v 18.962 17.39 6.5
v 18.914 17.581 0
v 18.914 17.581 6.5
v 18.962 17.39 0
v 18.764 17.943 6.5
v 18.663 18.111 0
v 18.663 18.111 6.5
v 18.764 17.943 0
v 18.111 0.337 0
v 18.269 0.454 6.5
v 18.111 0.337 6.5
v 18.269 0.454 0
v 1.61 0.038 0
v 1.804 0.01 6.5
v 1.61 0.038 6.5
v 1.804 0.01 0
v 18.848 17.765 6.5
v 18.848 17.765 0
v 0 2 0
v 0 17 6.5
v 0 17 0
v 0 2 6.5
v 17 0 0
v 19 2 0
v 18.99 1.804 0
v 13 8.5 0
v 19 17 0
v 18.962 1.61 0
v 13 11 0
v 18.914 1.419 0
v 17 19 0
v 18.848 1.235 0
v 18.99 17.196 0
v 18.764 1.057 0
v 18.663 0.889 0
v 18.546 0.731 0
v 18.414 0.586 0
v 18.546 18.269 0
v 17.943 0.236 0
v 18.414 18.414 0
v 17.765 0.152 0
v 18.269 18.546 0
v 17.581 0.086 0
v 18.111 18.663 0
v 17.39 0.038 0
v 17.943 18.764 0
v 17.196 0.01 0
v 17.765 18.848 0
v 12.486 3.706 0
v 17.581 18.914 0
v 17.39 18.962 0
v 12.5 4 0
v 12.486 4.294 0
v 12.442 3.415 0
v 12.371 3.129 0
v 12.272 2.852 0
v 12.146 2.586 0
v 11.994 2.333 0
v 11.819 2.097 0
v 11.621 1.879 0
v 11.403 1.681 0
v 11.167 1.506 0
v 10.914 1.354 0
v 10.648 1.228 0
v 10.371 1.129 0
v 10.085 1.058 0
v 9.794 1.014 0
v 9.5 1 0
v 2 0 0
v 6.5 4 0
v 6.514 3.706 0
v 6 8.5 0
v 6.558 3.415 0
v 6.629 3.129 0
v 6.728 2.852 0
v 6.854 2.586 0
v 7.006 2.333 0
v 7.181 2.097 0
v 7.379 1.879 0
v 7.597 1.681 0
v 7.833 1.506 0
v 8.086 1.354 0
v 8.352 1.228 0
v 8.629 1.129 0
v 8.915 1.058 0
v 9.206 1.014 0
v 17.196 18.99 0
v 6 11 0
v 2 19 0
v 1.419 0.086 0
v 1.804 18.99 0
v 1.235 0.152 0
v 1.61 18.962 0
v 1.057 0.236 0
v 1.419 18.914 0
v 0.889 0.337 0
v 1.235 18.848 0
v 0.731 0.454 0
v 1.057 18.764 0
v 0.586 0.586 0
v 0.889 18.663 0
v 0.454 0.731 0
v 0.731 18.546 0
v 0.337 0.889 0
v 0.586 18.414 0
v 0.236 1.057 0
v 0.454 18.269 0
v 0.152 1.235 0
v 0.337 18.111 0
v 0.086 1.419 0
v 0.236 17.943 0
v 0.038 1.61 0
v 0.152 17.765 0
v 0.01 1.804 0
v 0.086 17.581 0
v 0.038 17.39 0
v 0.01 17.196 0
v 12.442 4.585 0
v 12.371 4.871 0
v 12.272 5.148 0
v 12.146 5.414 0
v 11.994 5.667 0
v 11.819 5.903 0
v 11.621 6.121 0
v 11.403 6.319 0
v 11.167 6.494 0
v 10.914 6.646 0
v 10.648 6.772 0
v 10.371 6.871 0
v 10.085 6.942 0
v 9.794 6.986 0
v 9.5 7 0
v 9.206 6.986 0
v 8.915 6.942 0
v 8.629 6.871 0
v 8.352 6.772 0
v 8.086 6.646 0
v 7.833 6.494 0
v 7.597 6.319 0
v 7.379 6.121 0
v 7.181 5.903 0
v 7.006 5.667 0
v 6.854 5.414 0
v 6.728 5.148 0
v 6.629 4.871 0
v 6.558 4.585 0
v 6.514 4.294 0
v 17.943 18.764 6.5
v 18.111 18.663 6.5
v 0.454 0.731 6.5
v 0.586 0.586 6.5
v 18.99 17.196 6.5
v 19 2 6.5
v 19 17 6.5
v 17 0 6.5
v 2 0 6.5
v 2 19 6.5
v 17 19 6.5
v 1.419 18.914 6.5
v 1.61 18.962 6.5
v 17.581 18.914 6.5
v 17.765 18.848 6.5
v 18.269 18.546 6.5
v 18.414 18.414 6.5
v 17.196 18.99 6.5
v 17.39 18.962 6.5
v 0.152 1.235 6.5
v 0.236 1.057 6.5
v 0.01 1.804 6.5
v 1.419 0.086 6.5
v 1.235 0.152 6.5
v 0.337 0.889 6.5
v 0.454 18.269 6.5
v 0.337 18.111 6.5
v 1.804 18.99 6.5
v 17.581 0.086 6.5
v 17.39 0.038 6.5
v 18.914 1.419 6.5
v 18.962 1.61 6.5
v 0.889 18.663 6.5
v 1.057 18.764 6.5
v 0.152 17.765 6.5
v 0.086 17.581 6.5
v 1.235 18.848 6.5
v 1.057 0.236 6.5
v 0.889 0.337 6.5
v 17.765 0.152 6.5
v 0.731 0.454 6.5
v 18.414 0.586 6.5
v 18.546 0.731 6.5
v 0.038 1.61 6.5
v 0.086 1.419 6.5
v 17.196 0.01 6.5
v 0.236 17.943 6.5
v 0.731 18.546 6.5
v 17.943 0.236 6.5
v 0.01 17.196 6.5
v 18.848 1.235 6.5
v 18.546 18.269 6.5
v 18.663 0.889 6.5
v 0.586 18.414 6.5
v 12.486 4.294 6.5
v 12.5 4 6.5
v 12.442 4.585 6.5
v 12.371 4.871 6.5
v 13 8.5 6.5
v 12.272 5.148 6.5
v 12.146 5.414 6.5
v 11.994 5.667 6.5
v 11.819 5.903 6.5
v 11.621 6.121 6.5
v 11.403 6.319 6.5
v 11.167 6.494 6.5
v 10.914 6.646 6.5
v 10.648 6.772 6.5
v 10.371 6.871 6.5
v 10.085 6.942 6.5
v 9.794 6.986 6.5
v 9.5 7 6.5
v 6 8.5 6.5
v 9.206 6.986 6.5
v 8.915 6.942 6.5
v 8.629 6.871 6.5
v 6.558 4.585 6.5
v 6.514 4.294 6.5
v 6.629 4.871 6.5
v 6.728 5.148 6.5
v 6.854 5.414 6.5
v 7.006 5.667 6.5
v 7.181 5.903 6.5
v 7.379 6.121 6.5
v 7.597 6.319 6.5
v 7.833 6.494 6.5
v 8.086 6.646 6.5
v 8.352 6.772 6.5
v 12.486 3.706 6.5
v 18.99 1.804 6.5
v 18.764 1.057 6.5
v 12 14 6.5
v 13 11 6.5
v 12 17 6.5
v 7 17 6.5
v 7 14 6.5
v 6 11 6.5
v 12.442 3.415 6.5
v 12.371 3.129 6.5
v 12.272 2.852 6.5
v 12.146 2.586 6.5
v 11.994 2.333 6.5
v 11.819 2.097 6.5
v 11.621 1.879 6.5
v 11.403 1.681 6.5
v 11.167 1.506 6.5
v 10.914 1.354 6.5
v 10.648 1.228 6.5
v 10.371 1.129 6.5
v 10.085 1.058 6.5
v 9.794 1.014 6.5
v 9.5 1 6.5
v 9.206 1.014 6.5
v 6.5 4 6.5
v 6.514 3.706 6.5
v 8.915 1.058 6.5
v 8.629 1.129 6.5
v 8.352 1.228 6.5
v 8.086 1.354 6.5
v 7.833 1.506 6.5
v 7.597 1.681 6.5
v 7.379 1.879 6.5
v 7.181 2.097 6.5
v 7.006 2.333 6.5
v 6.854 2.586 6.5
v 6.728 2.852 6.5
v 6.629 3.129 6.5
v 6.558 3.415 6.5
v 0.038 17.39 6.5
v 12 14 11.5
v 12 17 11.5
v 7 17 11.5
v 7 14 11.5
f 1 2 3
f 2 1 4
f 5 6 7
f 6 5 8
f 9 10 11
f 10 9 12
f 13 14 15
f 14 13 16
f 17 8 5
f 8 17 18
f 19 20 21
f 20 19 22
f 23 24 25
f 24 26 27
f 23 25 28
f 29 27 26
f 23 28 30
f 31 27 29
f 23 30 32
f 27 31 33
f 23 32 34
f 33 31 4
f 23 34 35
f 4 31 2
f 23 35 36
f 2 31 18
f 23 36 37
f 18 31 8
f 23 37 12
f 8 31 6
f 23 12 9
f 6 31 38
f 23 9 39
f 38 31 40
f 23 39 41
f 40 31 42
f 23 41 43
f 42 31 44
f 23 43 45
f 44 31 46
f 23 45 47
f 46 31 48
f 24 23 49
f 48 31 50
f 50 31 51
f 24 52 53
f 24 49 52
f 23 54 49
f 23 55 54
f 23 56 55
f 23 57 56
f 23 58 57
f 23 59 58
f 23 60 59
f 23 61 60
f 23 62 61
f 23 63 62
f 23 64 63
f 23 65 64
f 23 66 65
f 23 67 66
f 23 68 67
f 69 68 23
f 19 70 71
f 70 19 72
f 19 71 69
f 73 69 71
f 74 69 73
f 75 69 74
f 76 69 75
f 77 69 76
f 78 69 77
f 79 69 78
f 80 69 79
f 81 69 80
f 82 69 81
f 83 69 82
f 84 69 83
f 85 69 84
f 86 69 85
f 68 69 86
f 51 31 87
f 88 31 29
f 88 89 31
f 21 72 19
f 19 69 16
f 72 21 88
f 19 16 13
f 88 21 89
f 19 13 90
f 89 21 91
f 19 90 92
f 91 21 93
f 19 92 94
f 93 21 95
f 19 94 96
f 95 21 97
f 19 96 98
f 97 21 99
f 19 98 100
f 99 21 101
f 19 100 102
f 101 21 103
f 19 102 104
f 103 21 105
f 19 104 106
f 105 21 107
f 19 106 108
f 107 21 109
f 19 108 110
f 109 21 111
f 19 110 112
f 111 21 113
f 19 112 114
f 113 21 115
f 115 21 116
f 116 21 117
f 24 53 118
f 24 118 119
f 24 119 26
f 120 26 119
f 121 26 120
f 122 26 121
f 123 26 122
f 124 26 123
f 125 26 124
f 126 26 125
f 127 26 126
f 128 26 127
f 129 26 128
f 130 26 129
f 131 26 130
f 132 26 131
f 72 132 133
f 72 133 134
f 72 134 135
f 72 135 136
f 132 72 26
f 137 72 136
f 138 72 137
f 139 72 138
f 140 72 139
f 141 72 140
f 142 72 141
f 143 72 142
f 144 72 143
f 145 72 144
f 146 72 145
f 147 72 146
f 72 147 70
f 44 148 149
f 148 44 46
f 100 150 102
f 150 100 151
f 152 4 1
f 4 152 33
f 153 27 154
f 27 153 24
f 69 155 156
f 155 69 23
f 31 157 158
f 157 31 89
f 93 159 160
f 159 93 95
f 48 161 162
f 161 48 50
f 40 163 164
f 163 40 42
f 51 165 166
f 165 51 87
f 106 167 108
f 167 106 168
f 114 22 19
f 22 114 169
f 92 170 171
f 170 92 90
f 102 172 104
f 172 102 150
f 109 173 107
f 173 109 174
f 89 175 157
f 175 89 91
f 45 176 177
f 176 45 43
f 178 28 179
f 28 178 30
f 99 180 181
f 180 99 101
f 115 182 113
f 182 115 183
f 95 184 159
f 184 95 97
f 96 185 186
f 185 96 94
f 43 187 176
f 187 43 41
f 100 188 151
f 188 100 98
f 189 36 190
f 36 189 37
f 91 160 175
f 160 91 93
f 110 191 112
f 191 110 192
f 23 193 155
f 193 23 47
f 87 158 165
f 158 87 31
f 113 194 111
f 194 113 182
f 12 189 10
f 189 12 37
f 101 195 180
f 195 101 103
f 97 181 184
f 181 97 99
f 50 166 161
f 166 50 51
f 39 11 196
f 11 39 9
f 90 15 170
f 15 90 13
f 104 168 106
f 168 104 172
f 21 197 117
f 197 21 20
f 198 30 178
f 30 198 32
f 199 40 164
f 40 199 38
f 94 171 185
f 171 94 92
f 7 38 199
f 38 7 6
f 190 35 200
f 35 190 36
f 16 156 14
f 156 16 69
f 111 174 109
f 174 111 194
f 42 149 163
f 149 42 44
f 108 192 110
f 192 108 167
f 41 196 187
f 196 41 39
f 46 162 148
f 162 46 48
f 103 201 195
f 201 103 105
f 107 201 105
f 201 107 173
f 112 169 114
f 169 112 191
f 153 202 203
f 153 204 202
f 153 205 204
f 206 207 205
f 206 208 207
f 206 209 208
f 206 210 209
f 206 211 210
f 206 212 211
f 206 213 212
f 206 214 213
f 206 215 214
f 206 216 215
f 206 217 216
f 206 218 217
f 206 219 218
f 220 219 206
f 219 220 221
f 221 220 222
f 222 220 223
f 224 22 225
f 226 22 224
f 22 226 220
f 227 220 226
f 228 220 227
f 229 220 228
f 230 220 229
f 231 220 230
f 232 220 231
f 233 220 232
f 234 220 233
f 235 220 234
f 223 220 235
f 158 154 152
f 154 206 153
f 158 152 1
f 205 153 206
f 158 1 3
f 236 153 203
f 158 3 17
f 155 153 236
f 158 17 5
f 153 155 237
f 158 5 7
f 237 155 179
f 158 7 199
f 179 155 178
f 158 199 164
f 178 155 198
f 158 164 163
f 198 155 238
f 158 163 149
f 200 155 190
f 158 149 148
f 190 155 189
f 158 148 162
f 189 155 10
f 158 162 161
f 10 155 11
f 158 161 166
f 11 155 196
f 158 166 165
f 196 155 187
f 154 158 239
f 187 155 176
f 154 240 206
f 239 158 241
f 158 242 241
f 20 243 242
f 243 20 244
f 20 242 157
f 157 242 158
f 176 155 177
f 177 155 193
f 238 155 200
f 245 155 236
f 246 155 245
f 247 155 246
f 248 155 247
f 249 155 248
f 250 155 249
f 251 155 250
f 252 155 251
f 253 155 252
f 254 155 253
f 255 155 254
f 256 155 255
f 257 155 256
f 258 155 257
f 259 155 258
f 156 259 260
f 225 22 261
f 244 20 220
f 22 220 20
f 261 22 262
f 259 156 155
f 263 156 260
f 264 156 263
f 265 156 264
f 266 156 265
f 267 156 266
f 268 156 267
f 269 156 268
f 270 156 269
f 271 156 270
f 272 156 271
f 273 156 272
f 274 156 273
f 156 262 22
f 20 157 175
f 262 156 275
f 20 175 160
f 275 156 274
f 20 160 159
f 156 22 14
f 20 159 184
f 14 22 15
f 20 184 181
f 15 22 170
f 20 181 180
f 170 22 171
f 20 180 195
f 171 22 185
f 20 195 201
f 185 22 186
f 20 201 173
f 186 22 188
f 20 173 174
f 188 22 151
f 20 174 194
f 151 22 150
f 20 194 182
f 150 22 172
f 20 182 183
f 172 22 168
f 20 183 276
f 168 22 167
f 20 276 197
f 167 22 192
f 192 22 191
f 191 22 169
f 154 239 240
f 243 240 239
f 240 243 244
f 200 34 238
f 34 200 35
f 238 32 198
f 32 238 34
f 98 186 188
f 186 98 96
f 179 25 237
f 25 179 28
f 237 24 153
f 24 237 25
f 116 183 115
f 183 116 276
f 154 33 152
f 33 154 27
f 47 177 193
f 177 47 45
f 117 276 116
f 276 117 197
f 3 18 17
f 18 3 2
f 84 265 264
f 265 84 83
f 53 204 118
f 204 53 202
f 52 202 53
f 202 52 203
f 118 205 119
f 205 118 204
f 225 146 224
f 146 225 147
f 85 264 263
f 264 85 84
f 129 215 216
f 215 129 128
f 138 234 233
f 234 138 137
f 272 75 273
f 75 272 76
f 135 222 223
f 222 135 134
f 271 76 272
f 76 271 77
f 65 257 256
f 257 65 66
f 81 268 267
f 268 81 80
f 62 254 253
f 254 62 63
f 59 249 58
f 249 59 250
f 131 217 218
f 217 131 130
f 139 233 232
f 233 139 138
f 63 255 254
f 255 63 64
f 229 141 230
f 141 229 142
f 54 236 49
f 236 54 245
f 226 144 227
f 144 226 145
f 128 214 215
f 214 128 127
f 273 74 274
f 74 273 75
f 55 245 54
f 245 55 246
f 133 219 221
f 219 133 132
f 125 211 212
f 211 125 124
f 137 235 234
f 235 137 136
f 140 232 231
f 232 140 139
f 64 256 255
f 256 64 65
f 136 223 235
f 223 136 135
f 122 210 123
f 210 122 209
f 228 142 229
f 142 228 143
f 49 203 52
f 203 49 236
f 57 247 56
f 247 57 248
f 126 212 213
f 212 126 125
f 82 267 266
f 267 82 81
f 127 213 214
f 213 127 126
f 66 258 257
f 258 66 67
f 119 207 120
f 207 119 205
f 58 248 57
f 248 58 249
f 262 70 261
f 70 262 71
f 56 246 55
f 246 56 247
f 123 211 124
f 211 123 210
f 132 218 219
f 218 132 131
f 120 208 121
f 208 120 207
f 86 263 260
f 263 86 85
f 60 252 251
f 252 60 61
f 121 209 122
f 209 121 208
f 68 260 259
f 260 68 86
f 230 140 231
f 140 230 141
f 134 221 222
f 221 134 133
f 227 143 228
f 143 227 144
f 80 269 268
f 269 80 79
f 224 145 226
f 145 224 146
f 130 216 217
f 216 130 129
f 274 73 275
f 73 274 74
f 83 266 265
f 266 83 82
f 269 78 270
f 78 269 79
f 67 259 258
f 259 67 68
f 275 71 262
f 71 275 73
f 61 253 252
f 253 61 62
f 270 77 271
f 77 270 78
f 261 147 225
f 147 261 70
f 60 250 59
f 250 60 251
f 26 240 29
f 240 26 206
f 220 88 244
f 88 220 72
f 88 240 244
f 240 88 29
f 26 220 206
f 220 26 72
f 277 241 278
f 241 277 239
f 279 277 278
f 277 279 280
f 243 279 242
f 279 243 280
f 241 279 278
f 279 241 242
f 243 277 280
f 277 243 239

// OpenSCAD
// laser engraver belt holder
$fn=64;

module roundedcube(xdim,ydim,zdim,rdim){
    hull(){
        translate([rdim,rdim,0]) cylinder(h=zdim,r=rdim);
        translate([xdim-rdim,rdim,0]) cylinder(h=zdim,r=rdim);
        translate([rdim,ydim-rdim,0]) cylinder(h=zdim,r=rdim);
        translate([xdim-rdim,ydim-rdim,0]) cylinder(h=zdim,r=rdim);
    }
}
difference() {
    roundedcube(19,19,6.5,2);
    translate([9.5,4,-0.5]) cylinder(h=7.5,r=3);
    translate([6,8.5,-0.5]) cube([7,2.5,7.5]);
}
translate([7,14,6.5]) cube([5,3,5]);
